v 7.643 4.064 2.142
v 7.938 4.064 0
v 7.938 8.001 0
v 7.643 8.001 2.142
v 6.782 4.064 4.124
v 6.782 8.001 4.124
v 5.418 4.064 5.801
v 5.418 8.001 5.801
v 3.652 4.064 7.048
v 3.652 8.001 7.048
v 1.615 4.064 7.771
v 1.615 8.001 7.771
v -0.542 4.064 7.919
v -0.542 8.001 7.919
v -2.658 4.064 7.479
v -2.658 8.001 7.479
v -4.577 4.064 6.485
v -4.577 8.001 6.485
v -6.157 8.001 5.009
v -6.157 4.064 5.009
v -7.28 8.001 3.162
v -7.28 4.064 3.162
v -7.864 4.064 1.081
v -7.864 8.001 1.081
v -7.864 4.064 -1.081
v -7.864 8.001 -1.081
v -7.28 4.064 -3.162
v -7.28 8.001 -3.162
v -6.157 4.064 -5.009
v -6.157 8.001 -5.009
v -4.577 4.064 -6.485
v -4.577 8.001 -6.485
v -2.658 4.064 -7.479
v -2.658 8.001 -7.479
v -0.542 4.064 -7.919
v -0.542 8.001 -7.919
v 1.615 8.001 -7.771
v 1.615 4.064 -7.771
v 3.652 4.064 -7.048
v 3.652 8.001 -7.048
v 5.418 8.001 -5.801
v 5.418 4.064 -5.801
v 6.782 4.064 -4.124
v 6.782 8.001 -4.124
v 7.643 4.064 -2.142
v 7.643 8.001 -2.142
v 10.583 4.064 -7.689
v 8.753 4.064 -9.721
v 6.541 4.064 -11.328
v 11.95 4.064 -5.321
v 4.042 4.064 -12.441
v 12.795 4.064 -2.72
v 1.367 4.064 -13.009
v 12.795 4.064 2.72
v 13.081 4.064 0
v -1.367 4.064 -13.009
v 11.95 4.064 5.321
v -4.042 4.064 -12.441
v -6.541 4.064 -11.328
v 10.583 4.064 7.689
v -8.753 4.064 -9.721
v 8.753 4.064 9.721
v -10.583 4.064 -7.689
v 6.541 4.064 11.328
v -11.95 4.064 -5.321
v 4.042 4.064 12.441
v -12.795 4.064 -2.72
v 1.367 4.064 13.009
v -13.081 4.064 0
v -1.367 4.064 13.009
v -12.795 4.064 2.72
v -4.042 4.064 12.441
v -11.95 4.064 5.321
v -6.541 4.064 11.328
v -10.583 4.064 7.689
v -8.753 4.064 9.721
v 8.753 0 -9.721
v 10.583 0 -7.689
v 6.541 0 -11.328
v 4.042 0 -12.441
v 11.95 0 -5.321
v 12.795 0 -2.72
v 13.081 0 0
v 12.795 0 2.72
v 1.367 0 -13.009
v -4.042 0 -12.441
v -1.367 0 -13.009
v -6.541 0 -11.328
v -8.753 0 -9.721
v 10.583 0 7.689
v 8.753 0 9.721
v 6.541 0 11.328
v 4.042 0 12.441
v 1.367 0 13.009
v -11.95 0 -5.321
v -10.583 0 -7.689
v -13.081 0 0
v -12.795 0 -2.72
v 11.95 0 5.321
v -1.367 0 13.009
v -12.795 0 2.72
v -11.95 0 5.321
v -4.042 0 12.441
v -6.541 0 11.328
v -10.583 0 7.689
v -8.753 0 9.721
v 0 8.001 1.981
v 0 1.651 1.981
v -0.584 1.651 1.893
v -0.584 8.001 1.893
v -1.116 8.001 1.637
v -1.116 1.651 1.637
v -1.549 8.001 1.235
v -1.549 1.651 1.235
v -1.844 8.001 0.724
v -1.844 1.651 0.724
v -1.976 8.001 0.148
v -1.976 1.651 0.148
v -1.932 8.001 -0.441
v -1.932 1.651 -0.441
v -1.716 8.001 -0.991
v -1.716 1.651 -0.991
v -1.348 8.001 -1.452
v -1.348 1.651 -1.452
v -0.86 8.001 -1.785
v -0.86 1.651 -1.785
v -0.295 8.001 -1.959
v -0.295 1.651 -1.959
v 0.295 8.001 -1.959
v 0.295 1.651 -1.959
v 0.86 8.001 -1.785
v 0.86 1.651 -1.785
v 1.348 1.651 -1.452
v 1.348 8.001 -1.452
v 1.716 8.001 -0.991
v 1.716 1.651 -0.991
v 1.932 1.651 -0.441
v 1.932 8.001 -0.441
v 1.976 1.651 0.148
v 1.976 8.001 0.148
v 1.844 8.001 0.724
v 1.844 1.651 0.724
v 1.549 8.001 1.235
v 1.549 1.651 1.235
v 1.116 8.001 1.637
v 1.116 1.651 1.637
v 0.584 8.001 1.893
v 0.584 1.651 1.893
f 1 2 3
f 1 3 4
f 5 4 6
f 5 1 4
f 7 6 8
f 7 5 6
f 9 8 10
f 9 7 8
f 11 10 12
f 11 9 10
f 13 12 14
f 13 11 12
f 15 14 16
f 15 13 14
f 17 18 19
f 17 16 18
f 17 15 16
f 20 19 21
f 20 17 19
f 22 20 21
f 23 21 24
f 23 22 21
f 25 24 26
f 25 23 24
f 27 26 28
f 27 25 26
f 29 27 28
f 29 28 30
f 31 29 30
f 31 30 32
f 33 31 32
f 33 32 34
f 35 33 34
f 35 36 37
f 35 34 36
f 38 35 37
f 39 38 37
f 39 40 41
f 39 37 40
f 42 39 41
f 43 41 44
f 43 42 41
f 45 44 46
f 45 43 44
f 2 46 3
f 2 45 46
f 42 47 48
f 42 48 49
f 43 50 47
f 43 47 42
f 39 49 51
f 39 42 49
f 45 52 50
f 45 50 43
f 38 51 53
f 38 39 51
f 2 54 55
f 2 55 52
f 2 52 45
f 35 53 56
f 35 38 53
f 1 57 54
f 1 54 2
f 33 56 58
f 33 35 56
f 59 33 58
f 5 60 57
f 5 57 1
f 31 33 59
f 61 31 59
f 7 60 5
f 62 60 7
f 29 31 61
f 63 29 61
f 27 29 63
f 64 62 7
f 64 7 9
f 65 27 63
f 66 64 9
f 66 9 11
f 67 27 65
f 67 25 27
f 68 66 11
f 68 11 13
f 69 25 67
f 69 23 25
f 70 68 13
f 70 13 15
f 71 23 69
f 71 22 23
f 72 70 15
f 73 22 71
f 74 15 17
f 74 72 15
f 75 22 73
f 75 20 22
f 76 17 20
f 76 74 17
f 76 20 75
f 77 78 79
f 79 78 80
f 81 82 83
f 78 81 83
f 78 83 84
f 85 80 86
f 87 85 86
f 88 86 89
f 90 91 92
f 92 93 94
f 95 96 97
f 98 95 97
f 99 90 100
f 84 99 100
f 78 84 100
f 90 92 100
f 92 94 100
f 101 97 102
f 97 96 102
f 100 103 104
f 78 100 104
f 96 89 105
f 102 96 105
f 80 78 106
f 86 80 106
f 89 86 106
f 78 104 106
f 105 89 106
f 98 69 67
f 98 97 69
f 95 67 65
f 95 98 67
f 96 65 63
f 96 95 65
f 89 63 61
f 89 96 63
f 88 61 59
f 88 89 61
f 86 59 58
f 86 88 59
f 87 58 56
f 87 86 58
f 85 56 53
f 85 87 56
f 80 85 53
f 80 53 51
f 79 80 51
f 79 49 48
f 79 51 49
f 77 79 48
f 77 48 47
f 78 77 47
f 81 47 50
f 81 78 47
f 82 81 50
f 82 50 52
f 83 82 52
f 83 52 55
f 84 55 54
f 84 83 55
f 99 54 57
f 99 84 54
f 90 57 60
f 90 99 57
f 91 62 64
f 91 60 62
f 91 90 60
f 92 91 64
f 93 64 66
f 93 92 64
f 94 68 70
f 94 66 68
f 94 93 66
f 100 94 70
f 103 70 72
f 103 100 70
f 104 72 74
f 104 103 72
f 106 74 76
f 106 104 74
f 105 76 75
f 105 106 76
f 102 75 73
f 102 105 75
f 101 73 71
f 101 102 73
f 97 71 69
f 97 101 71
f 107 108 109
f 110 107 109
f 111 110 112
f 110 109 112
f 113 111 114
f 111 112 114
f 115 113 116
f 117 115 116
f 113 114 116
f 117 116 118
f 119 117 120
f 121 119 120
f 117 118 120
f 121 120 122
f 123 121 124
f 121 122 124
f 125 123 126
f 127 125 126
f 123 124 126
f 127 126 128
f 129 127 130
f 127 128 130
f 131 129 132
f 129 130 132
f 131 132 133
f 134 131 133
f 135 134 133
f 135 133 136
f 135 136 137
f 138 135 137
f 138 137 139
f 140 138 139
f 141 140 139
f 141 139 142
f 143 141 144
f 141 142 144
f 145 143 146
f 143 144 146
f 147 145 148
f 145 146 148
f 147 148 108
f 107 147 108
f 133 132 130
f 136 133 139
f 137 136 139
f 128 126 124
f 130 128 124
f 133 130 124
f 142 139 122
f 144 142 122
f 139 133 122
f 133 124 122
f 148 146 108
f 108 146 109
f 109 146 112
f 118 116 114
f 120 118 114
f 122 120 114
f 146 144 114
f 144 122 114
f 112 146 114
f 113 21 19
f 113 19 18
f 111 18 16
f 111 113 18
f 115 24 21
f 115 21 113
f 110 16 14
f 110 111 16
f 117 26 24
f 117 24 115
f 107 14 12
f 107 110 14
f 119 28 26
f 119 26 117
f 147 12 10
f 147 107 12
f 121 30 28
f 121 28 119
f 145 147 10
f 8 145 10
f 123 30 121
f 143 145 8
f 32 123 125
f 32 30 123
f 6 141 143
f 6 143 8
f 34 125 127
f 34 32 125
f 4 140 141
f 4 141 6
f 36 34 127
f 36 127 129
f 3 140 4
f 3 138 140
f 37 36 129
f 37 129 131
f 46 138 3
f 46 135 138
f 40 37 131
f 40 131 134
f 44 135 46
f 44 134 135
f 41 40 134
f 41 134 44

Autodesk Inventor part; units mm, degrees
ref_plane "YZ Plane" through (0, 0, 0) normal (1, 0, 0) x (0, 1, 0)
ref_plane "XZ Plane" through (0, 0, 0) normal (0, 1, 0) x (-1, 0, 0)
ref_plane "XY Plane" through (0, 0, 0) normal (0, 0, 1) x (1, 0, 0)
sketch "Sketch1" plane through (0, 0, 0) normal (0, 1, 0) x (-1, 0, 0)
  circle A0 centre (0, 0) radius 13.081
  dimension "outerDiamKnurledKnob" = 26.162
extrude "Extrusion1" add sketch "Sketch1" along normal blind 4.064
sketch "Sketch2" plane through (0, 4.064, 0) normal (0, 1, 0) x (1, 0, 0)
  circle A0 centre (0, 0) radius 7.9375
  dimension "innerRingDiam" = 15.875
extrude "Extrusion2" add sketch "Sketch2" along normal blind 3.937
sketch "Sketch3" plane through (0, 8.001, 0) normal (0, 1, 0) x (1, 0, 0)
  point P0 (0, 0)
  point P1 (0, 0)
hole "Hole1" at (0, 8.001, 0) direction (0, -1, 0) diameter 3.9624 depth 6.35 thread size "10-32 UNF" class "2B" standard "ANSI Unified Screw Threads"
properties part number "knurledKnob" material "Aluminum 6061"
